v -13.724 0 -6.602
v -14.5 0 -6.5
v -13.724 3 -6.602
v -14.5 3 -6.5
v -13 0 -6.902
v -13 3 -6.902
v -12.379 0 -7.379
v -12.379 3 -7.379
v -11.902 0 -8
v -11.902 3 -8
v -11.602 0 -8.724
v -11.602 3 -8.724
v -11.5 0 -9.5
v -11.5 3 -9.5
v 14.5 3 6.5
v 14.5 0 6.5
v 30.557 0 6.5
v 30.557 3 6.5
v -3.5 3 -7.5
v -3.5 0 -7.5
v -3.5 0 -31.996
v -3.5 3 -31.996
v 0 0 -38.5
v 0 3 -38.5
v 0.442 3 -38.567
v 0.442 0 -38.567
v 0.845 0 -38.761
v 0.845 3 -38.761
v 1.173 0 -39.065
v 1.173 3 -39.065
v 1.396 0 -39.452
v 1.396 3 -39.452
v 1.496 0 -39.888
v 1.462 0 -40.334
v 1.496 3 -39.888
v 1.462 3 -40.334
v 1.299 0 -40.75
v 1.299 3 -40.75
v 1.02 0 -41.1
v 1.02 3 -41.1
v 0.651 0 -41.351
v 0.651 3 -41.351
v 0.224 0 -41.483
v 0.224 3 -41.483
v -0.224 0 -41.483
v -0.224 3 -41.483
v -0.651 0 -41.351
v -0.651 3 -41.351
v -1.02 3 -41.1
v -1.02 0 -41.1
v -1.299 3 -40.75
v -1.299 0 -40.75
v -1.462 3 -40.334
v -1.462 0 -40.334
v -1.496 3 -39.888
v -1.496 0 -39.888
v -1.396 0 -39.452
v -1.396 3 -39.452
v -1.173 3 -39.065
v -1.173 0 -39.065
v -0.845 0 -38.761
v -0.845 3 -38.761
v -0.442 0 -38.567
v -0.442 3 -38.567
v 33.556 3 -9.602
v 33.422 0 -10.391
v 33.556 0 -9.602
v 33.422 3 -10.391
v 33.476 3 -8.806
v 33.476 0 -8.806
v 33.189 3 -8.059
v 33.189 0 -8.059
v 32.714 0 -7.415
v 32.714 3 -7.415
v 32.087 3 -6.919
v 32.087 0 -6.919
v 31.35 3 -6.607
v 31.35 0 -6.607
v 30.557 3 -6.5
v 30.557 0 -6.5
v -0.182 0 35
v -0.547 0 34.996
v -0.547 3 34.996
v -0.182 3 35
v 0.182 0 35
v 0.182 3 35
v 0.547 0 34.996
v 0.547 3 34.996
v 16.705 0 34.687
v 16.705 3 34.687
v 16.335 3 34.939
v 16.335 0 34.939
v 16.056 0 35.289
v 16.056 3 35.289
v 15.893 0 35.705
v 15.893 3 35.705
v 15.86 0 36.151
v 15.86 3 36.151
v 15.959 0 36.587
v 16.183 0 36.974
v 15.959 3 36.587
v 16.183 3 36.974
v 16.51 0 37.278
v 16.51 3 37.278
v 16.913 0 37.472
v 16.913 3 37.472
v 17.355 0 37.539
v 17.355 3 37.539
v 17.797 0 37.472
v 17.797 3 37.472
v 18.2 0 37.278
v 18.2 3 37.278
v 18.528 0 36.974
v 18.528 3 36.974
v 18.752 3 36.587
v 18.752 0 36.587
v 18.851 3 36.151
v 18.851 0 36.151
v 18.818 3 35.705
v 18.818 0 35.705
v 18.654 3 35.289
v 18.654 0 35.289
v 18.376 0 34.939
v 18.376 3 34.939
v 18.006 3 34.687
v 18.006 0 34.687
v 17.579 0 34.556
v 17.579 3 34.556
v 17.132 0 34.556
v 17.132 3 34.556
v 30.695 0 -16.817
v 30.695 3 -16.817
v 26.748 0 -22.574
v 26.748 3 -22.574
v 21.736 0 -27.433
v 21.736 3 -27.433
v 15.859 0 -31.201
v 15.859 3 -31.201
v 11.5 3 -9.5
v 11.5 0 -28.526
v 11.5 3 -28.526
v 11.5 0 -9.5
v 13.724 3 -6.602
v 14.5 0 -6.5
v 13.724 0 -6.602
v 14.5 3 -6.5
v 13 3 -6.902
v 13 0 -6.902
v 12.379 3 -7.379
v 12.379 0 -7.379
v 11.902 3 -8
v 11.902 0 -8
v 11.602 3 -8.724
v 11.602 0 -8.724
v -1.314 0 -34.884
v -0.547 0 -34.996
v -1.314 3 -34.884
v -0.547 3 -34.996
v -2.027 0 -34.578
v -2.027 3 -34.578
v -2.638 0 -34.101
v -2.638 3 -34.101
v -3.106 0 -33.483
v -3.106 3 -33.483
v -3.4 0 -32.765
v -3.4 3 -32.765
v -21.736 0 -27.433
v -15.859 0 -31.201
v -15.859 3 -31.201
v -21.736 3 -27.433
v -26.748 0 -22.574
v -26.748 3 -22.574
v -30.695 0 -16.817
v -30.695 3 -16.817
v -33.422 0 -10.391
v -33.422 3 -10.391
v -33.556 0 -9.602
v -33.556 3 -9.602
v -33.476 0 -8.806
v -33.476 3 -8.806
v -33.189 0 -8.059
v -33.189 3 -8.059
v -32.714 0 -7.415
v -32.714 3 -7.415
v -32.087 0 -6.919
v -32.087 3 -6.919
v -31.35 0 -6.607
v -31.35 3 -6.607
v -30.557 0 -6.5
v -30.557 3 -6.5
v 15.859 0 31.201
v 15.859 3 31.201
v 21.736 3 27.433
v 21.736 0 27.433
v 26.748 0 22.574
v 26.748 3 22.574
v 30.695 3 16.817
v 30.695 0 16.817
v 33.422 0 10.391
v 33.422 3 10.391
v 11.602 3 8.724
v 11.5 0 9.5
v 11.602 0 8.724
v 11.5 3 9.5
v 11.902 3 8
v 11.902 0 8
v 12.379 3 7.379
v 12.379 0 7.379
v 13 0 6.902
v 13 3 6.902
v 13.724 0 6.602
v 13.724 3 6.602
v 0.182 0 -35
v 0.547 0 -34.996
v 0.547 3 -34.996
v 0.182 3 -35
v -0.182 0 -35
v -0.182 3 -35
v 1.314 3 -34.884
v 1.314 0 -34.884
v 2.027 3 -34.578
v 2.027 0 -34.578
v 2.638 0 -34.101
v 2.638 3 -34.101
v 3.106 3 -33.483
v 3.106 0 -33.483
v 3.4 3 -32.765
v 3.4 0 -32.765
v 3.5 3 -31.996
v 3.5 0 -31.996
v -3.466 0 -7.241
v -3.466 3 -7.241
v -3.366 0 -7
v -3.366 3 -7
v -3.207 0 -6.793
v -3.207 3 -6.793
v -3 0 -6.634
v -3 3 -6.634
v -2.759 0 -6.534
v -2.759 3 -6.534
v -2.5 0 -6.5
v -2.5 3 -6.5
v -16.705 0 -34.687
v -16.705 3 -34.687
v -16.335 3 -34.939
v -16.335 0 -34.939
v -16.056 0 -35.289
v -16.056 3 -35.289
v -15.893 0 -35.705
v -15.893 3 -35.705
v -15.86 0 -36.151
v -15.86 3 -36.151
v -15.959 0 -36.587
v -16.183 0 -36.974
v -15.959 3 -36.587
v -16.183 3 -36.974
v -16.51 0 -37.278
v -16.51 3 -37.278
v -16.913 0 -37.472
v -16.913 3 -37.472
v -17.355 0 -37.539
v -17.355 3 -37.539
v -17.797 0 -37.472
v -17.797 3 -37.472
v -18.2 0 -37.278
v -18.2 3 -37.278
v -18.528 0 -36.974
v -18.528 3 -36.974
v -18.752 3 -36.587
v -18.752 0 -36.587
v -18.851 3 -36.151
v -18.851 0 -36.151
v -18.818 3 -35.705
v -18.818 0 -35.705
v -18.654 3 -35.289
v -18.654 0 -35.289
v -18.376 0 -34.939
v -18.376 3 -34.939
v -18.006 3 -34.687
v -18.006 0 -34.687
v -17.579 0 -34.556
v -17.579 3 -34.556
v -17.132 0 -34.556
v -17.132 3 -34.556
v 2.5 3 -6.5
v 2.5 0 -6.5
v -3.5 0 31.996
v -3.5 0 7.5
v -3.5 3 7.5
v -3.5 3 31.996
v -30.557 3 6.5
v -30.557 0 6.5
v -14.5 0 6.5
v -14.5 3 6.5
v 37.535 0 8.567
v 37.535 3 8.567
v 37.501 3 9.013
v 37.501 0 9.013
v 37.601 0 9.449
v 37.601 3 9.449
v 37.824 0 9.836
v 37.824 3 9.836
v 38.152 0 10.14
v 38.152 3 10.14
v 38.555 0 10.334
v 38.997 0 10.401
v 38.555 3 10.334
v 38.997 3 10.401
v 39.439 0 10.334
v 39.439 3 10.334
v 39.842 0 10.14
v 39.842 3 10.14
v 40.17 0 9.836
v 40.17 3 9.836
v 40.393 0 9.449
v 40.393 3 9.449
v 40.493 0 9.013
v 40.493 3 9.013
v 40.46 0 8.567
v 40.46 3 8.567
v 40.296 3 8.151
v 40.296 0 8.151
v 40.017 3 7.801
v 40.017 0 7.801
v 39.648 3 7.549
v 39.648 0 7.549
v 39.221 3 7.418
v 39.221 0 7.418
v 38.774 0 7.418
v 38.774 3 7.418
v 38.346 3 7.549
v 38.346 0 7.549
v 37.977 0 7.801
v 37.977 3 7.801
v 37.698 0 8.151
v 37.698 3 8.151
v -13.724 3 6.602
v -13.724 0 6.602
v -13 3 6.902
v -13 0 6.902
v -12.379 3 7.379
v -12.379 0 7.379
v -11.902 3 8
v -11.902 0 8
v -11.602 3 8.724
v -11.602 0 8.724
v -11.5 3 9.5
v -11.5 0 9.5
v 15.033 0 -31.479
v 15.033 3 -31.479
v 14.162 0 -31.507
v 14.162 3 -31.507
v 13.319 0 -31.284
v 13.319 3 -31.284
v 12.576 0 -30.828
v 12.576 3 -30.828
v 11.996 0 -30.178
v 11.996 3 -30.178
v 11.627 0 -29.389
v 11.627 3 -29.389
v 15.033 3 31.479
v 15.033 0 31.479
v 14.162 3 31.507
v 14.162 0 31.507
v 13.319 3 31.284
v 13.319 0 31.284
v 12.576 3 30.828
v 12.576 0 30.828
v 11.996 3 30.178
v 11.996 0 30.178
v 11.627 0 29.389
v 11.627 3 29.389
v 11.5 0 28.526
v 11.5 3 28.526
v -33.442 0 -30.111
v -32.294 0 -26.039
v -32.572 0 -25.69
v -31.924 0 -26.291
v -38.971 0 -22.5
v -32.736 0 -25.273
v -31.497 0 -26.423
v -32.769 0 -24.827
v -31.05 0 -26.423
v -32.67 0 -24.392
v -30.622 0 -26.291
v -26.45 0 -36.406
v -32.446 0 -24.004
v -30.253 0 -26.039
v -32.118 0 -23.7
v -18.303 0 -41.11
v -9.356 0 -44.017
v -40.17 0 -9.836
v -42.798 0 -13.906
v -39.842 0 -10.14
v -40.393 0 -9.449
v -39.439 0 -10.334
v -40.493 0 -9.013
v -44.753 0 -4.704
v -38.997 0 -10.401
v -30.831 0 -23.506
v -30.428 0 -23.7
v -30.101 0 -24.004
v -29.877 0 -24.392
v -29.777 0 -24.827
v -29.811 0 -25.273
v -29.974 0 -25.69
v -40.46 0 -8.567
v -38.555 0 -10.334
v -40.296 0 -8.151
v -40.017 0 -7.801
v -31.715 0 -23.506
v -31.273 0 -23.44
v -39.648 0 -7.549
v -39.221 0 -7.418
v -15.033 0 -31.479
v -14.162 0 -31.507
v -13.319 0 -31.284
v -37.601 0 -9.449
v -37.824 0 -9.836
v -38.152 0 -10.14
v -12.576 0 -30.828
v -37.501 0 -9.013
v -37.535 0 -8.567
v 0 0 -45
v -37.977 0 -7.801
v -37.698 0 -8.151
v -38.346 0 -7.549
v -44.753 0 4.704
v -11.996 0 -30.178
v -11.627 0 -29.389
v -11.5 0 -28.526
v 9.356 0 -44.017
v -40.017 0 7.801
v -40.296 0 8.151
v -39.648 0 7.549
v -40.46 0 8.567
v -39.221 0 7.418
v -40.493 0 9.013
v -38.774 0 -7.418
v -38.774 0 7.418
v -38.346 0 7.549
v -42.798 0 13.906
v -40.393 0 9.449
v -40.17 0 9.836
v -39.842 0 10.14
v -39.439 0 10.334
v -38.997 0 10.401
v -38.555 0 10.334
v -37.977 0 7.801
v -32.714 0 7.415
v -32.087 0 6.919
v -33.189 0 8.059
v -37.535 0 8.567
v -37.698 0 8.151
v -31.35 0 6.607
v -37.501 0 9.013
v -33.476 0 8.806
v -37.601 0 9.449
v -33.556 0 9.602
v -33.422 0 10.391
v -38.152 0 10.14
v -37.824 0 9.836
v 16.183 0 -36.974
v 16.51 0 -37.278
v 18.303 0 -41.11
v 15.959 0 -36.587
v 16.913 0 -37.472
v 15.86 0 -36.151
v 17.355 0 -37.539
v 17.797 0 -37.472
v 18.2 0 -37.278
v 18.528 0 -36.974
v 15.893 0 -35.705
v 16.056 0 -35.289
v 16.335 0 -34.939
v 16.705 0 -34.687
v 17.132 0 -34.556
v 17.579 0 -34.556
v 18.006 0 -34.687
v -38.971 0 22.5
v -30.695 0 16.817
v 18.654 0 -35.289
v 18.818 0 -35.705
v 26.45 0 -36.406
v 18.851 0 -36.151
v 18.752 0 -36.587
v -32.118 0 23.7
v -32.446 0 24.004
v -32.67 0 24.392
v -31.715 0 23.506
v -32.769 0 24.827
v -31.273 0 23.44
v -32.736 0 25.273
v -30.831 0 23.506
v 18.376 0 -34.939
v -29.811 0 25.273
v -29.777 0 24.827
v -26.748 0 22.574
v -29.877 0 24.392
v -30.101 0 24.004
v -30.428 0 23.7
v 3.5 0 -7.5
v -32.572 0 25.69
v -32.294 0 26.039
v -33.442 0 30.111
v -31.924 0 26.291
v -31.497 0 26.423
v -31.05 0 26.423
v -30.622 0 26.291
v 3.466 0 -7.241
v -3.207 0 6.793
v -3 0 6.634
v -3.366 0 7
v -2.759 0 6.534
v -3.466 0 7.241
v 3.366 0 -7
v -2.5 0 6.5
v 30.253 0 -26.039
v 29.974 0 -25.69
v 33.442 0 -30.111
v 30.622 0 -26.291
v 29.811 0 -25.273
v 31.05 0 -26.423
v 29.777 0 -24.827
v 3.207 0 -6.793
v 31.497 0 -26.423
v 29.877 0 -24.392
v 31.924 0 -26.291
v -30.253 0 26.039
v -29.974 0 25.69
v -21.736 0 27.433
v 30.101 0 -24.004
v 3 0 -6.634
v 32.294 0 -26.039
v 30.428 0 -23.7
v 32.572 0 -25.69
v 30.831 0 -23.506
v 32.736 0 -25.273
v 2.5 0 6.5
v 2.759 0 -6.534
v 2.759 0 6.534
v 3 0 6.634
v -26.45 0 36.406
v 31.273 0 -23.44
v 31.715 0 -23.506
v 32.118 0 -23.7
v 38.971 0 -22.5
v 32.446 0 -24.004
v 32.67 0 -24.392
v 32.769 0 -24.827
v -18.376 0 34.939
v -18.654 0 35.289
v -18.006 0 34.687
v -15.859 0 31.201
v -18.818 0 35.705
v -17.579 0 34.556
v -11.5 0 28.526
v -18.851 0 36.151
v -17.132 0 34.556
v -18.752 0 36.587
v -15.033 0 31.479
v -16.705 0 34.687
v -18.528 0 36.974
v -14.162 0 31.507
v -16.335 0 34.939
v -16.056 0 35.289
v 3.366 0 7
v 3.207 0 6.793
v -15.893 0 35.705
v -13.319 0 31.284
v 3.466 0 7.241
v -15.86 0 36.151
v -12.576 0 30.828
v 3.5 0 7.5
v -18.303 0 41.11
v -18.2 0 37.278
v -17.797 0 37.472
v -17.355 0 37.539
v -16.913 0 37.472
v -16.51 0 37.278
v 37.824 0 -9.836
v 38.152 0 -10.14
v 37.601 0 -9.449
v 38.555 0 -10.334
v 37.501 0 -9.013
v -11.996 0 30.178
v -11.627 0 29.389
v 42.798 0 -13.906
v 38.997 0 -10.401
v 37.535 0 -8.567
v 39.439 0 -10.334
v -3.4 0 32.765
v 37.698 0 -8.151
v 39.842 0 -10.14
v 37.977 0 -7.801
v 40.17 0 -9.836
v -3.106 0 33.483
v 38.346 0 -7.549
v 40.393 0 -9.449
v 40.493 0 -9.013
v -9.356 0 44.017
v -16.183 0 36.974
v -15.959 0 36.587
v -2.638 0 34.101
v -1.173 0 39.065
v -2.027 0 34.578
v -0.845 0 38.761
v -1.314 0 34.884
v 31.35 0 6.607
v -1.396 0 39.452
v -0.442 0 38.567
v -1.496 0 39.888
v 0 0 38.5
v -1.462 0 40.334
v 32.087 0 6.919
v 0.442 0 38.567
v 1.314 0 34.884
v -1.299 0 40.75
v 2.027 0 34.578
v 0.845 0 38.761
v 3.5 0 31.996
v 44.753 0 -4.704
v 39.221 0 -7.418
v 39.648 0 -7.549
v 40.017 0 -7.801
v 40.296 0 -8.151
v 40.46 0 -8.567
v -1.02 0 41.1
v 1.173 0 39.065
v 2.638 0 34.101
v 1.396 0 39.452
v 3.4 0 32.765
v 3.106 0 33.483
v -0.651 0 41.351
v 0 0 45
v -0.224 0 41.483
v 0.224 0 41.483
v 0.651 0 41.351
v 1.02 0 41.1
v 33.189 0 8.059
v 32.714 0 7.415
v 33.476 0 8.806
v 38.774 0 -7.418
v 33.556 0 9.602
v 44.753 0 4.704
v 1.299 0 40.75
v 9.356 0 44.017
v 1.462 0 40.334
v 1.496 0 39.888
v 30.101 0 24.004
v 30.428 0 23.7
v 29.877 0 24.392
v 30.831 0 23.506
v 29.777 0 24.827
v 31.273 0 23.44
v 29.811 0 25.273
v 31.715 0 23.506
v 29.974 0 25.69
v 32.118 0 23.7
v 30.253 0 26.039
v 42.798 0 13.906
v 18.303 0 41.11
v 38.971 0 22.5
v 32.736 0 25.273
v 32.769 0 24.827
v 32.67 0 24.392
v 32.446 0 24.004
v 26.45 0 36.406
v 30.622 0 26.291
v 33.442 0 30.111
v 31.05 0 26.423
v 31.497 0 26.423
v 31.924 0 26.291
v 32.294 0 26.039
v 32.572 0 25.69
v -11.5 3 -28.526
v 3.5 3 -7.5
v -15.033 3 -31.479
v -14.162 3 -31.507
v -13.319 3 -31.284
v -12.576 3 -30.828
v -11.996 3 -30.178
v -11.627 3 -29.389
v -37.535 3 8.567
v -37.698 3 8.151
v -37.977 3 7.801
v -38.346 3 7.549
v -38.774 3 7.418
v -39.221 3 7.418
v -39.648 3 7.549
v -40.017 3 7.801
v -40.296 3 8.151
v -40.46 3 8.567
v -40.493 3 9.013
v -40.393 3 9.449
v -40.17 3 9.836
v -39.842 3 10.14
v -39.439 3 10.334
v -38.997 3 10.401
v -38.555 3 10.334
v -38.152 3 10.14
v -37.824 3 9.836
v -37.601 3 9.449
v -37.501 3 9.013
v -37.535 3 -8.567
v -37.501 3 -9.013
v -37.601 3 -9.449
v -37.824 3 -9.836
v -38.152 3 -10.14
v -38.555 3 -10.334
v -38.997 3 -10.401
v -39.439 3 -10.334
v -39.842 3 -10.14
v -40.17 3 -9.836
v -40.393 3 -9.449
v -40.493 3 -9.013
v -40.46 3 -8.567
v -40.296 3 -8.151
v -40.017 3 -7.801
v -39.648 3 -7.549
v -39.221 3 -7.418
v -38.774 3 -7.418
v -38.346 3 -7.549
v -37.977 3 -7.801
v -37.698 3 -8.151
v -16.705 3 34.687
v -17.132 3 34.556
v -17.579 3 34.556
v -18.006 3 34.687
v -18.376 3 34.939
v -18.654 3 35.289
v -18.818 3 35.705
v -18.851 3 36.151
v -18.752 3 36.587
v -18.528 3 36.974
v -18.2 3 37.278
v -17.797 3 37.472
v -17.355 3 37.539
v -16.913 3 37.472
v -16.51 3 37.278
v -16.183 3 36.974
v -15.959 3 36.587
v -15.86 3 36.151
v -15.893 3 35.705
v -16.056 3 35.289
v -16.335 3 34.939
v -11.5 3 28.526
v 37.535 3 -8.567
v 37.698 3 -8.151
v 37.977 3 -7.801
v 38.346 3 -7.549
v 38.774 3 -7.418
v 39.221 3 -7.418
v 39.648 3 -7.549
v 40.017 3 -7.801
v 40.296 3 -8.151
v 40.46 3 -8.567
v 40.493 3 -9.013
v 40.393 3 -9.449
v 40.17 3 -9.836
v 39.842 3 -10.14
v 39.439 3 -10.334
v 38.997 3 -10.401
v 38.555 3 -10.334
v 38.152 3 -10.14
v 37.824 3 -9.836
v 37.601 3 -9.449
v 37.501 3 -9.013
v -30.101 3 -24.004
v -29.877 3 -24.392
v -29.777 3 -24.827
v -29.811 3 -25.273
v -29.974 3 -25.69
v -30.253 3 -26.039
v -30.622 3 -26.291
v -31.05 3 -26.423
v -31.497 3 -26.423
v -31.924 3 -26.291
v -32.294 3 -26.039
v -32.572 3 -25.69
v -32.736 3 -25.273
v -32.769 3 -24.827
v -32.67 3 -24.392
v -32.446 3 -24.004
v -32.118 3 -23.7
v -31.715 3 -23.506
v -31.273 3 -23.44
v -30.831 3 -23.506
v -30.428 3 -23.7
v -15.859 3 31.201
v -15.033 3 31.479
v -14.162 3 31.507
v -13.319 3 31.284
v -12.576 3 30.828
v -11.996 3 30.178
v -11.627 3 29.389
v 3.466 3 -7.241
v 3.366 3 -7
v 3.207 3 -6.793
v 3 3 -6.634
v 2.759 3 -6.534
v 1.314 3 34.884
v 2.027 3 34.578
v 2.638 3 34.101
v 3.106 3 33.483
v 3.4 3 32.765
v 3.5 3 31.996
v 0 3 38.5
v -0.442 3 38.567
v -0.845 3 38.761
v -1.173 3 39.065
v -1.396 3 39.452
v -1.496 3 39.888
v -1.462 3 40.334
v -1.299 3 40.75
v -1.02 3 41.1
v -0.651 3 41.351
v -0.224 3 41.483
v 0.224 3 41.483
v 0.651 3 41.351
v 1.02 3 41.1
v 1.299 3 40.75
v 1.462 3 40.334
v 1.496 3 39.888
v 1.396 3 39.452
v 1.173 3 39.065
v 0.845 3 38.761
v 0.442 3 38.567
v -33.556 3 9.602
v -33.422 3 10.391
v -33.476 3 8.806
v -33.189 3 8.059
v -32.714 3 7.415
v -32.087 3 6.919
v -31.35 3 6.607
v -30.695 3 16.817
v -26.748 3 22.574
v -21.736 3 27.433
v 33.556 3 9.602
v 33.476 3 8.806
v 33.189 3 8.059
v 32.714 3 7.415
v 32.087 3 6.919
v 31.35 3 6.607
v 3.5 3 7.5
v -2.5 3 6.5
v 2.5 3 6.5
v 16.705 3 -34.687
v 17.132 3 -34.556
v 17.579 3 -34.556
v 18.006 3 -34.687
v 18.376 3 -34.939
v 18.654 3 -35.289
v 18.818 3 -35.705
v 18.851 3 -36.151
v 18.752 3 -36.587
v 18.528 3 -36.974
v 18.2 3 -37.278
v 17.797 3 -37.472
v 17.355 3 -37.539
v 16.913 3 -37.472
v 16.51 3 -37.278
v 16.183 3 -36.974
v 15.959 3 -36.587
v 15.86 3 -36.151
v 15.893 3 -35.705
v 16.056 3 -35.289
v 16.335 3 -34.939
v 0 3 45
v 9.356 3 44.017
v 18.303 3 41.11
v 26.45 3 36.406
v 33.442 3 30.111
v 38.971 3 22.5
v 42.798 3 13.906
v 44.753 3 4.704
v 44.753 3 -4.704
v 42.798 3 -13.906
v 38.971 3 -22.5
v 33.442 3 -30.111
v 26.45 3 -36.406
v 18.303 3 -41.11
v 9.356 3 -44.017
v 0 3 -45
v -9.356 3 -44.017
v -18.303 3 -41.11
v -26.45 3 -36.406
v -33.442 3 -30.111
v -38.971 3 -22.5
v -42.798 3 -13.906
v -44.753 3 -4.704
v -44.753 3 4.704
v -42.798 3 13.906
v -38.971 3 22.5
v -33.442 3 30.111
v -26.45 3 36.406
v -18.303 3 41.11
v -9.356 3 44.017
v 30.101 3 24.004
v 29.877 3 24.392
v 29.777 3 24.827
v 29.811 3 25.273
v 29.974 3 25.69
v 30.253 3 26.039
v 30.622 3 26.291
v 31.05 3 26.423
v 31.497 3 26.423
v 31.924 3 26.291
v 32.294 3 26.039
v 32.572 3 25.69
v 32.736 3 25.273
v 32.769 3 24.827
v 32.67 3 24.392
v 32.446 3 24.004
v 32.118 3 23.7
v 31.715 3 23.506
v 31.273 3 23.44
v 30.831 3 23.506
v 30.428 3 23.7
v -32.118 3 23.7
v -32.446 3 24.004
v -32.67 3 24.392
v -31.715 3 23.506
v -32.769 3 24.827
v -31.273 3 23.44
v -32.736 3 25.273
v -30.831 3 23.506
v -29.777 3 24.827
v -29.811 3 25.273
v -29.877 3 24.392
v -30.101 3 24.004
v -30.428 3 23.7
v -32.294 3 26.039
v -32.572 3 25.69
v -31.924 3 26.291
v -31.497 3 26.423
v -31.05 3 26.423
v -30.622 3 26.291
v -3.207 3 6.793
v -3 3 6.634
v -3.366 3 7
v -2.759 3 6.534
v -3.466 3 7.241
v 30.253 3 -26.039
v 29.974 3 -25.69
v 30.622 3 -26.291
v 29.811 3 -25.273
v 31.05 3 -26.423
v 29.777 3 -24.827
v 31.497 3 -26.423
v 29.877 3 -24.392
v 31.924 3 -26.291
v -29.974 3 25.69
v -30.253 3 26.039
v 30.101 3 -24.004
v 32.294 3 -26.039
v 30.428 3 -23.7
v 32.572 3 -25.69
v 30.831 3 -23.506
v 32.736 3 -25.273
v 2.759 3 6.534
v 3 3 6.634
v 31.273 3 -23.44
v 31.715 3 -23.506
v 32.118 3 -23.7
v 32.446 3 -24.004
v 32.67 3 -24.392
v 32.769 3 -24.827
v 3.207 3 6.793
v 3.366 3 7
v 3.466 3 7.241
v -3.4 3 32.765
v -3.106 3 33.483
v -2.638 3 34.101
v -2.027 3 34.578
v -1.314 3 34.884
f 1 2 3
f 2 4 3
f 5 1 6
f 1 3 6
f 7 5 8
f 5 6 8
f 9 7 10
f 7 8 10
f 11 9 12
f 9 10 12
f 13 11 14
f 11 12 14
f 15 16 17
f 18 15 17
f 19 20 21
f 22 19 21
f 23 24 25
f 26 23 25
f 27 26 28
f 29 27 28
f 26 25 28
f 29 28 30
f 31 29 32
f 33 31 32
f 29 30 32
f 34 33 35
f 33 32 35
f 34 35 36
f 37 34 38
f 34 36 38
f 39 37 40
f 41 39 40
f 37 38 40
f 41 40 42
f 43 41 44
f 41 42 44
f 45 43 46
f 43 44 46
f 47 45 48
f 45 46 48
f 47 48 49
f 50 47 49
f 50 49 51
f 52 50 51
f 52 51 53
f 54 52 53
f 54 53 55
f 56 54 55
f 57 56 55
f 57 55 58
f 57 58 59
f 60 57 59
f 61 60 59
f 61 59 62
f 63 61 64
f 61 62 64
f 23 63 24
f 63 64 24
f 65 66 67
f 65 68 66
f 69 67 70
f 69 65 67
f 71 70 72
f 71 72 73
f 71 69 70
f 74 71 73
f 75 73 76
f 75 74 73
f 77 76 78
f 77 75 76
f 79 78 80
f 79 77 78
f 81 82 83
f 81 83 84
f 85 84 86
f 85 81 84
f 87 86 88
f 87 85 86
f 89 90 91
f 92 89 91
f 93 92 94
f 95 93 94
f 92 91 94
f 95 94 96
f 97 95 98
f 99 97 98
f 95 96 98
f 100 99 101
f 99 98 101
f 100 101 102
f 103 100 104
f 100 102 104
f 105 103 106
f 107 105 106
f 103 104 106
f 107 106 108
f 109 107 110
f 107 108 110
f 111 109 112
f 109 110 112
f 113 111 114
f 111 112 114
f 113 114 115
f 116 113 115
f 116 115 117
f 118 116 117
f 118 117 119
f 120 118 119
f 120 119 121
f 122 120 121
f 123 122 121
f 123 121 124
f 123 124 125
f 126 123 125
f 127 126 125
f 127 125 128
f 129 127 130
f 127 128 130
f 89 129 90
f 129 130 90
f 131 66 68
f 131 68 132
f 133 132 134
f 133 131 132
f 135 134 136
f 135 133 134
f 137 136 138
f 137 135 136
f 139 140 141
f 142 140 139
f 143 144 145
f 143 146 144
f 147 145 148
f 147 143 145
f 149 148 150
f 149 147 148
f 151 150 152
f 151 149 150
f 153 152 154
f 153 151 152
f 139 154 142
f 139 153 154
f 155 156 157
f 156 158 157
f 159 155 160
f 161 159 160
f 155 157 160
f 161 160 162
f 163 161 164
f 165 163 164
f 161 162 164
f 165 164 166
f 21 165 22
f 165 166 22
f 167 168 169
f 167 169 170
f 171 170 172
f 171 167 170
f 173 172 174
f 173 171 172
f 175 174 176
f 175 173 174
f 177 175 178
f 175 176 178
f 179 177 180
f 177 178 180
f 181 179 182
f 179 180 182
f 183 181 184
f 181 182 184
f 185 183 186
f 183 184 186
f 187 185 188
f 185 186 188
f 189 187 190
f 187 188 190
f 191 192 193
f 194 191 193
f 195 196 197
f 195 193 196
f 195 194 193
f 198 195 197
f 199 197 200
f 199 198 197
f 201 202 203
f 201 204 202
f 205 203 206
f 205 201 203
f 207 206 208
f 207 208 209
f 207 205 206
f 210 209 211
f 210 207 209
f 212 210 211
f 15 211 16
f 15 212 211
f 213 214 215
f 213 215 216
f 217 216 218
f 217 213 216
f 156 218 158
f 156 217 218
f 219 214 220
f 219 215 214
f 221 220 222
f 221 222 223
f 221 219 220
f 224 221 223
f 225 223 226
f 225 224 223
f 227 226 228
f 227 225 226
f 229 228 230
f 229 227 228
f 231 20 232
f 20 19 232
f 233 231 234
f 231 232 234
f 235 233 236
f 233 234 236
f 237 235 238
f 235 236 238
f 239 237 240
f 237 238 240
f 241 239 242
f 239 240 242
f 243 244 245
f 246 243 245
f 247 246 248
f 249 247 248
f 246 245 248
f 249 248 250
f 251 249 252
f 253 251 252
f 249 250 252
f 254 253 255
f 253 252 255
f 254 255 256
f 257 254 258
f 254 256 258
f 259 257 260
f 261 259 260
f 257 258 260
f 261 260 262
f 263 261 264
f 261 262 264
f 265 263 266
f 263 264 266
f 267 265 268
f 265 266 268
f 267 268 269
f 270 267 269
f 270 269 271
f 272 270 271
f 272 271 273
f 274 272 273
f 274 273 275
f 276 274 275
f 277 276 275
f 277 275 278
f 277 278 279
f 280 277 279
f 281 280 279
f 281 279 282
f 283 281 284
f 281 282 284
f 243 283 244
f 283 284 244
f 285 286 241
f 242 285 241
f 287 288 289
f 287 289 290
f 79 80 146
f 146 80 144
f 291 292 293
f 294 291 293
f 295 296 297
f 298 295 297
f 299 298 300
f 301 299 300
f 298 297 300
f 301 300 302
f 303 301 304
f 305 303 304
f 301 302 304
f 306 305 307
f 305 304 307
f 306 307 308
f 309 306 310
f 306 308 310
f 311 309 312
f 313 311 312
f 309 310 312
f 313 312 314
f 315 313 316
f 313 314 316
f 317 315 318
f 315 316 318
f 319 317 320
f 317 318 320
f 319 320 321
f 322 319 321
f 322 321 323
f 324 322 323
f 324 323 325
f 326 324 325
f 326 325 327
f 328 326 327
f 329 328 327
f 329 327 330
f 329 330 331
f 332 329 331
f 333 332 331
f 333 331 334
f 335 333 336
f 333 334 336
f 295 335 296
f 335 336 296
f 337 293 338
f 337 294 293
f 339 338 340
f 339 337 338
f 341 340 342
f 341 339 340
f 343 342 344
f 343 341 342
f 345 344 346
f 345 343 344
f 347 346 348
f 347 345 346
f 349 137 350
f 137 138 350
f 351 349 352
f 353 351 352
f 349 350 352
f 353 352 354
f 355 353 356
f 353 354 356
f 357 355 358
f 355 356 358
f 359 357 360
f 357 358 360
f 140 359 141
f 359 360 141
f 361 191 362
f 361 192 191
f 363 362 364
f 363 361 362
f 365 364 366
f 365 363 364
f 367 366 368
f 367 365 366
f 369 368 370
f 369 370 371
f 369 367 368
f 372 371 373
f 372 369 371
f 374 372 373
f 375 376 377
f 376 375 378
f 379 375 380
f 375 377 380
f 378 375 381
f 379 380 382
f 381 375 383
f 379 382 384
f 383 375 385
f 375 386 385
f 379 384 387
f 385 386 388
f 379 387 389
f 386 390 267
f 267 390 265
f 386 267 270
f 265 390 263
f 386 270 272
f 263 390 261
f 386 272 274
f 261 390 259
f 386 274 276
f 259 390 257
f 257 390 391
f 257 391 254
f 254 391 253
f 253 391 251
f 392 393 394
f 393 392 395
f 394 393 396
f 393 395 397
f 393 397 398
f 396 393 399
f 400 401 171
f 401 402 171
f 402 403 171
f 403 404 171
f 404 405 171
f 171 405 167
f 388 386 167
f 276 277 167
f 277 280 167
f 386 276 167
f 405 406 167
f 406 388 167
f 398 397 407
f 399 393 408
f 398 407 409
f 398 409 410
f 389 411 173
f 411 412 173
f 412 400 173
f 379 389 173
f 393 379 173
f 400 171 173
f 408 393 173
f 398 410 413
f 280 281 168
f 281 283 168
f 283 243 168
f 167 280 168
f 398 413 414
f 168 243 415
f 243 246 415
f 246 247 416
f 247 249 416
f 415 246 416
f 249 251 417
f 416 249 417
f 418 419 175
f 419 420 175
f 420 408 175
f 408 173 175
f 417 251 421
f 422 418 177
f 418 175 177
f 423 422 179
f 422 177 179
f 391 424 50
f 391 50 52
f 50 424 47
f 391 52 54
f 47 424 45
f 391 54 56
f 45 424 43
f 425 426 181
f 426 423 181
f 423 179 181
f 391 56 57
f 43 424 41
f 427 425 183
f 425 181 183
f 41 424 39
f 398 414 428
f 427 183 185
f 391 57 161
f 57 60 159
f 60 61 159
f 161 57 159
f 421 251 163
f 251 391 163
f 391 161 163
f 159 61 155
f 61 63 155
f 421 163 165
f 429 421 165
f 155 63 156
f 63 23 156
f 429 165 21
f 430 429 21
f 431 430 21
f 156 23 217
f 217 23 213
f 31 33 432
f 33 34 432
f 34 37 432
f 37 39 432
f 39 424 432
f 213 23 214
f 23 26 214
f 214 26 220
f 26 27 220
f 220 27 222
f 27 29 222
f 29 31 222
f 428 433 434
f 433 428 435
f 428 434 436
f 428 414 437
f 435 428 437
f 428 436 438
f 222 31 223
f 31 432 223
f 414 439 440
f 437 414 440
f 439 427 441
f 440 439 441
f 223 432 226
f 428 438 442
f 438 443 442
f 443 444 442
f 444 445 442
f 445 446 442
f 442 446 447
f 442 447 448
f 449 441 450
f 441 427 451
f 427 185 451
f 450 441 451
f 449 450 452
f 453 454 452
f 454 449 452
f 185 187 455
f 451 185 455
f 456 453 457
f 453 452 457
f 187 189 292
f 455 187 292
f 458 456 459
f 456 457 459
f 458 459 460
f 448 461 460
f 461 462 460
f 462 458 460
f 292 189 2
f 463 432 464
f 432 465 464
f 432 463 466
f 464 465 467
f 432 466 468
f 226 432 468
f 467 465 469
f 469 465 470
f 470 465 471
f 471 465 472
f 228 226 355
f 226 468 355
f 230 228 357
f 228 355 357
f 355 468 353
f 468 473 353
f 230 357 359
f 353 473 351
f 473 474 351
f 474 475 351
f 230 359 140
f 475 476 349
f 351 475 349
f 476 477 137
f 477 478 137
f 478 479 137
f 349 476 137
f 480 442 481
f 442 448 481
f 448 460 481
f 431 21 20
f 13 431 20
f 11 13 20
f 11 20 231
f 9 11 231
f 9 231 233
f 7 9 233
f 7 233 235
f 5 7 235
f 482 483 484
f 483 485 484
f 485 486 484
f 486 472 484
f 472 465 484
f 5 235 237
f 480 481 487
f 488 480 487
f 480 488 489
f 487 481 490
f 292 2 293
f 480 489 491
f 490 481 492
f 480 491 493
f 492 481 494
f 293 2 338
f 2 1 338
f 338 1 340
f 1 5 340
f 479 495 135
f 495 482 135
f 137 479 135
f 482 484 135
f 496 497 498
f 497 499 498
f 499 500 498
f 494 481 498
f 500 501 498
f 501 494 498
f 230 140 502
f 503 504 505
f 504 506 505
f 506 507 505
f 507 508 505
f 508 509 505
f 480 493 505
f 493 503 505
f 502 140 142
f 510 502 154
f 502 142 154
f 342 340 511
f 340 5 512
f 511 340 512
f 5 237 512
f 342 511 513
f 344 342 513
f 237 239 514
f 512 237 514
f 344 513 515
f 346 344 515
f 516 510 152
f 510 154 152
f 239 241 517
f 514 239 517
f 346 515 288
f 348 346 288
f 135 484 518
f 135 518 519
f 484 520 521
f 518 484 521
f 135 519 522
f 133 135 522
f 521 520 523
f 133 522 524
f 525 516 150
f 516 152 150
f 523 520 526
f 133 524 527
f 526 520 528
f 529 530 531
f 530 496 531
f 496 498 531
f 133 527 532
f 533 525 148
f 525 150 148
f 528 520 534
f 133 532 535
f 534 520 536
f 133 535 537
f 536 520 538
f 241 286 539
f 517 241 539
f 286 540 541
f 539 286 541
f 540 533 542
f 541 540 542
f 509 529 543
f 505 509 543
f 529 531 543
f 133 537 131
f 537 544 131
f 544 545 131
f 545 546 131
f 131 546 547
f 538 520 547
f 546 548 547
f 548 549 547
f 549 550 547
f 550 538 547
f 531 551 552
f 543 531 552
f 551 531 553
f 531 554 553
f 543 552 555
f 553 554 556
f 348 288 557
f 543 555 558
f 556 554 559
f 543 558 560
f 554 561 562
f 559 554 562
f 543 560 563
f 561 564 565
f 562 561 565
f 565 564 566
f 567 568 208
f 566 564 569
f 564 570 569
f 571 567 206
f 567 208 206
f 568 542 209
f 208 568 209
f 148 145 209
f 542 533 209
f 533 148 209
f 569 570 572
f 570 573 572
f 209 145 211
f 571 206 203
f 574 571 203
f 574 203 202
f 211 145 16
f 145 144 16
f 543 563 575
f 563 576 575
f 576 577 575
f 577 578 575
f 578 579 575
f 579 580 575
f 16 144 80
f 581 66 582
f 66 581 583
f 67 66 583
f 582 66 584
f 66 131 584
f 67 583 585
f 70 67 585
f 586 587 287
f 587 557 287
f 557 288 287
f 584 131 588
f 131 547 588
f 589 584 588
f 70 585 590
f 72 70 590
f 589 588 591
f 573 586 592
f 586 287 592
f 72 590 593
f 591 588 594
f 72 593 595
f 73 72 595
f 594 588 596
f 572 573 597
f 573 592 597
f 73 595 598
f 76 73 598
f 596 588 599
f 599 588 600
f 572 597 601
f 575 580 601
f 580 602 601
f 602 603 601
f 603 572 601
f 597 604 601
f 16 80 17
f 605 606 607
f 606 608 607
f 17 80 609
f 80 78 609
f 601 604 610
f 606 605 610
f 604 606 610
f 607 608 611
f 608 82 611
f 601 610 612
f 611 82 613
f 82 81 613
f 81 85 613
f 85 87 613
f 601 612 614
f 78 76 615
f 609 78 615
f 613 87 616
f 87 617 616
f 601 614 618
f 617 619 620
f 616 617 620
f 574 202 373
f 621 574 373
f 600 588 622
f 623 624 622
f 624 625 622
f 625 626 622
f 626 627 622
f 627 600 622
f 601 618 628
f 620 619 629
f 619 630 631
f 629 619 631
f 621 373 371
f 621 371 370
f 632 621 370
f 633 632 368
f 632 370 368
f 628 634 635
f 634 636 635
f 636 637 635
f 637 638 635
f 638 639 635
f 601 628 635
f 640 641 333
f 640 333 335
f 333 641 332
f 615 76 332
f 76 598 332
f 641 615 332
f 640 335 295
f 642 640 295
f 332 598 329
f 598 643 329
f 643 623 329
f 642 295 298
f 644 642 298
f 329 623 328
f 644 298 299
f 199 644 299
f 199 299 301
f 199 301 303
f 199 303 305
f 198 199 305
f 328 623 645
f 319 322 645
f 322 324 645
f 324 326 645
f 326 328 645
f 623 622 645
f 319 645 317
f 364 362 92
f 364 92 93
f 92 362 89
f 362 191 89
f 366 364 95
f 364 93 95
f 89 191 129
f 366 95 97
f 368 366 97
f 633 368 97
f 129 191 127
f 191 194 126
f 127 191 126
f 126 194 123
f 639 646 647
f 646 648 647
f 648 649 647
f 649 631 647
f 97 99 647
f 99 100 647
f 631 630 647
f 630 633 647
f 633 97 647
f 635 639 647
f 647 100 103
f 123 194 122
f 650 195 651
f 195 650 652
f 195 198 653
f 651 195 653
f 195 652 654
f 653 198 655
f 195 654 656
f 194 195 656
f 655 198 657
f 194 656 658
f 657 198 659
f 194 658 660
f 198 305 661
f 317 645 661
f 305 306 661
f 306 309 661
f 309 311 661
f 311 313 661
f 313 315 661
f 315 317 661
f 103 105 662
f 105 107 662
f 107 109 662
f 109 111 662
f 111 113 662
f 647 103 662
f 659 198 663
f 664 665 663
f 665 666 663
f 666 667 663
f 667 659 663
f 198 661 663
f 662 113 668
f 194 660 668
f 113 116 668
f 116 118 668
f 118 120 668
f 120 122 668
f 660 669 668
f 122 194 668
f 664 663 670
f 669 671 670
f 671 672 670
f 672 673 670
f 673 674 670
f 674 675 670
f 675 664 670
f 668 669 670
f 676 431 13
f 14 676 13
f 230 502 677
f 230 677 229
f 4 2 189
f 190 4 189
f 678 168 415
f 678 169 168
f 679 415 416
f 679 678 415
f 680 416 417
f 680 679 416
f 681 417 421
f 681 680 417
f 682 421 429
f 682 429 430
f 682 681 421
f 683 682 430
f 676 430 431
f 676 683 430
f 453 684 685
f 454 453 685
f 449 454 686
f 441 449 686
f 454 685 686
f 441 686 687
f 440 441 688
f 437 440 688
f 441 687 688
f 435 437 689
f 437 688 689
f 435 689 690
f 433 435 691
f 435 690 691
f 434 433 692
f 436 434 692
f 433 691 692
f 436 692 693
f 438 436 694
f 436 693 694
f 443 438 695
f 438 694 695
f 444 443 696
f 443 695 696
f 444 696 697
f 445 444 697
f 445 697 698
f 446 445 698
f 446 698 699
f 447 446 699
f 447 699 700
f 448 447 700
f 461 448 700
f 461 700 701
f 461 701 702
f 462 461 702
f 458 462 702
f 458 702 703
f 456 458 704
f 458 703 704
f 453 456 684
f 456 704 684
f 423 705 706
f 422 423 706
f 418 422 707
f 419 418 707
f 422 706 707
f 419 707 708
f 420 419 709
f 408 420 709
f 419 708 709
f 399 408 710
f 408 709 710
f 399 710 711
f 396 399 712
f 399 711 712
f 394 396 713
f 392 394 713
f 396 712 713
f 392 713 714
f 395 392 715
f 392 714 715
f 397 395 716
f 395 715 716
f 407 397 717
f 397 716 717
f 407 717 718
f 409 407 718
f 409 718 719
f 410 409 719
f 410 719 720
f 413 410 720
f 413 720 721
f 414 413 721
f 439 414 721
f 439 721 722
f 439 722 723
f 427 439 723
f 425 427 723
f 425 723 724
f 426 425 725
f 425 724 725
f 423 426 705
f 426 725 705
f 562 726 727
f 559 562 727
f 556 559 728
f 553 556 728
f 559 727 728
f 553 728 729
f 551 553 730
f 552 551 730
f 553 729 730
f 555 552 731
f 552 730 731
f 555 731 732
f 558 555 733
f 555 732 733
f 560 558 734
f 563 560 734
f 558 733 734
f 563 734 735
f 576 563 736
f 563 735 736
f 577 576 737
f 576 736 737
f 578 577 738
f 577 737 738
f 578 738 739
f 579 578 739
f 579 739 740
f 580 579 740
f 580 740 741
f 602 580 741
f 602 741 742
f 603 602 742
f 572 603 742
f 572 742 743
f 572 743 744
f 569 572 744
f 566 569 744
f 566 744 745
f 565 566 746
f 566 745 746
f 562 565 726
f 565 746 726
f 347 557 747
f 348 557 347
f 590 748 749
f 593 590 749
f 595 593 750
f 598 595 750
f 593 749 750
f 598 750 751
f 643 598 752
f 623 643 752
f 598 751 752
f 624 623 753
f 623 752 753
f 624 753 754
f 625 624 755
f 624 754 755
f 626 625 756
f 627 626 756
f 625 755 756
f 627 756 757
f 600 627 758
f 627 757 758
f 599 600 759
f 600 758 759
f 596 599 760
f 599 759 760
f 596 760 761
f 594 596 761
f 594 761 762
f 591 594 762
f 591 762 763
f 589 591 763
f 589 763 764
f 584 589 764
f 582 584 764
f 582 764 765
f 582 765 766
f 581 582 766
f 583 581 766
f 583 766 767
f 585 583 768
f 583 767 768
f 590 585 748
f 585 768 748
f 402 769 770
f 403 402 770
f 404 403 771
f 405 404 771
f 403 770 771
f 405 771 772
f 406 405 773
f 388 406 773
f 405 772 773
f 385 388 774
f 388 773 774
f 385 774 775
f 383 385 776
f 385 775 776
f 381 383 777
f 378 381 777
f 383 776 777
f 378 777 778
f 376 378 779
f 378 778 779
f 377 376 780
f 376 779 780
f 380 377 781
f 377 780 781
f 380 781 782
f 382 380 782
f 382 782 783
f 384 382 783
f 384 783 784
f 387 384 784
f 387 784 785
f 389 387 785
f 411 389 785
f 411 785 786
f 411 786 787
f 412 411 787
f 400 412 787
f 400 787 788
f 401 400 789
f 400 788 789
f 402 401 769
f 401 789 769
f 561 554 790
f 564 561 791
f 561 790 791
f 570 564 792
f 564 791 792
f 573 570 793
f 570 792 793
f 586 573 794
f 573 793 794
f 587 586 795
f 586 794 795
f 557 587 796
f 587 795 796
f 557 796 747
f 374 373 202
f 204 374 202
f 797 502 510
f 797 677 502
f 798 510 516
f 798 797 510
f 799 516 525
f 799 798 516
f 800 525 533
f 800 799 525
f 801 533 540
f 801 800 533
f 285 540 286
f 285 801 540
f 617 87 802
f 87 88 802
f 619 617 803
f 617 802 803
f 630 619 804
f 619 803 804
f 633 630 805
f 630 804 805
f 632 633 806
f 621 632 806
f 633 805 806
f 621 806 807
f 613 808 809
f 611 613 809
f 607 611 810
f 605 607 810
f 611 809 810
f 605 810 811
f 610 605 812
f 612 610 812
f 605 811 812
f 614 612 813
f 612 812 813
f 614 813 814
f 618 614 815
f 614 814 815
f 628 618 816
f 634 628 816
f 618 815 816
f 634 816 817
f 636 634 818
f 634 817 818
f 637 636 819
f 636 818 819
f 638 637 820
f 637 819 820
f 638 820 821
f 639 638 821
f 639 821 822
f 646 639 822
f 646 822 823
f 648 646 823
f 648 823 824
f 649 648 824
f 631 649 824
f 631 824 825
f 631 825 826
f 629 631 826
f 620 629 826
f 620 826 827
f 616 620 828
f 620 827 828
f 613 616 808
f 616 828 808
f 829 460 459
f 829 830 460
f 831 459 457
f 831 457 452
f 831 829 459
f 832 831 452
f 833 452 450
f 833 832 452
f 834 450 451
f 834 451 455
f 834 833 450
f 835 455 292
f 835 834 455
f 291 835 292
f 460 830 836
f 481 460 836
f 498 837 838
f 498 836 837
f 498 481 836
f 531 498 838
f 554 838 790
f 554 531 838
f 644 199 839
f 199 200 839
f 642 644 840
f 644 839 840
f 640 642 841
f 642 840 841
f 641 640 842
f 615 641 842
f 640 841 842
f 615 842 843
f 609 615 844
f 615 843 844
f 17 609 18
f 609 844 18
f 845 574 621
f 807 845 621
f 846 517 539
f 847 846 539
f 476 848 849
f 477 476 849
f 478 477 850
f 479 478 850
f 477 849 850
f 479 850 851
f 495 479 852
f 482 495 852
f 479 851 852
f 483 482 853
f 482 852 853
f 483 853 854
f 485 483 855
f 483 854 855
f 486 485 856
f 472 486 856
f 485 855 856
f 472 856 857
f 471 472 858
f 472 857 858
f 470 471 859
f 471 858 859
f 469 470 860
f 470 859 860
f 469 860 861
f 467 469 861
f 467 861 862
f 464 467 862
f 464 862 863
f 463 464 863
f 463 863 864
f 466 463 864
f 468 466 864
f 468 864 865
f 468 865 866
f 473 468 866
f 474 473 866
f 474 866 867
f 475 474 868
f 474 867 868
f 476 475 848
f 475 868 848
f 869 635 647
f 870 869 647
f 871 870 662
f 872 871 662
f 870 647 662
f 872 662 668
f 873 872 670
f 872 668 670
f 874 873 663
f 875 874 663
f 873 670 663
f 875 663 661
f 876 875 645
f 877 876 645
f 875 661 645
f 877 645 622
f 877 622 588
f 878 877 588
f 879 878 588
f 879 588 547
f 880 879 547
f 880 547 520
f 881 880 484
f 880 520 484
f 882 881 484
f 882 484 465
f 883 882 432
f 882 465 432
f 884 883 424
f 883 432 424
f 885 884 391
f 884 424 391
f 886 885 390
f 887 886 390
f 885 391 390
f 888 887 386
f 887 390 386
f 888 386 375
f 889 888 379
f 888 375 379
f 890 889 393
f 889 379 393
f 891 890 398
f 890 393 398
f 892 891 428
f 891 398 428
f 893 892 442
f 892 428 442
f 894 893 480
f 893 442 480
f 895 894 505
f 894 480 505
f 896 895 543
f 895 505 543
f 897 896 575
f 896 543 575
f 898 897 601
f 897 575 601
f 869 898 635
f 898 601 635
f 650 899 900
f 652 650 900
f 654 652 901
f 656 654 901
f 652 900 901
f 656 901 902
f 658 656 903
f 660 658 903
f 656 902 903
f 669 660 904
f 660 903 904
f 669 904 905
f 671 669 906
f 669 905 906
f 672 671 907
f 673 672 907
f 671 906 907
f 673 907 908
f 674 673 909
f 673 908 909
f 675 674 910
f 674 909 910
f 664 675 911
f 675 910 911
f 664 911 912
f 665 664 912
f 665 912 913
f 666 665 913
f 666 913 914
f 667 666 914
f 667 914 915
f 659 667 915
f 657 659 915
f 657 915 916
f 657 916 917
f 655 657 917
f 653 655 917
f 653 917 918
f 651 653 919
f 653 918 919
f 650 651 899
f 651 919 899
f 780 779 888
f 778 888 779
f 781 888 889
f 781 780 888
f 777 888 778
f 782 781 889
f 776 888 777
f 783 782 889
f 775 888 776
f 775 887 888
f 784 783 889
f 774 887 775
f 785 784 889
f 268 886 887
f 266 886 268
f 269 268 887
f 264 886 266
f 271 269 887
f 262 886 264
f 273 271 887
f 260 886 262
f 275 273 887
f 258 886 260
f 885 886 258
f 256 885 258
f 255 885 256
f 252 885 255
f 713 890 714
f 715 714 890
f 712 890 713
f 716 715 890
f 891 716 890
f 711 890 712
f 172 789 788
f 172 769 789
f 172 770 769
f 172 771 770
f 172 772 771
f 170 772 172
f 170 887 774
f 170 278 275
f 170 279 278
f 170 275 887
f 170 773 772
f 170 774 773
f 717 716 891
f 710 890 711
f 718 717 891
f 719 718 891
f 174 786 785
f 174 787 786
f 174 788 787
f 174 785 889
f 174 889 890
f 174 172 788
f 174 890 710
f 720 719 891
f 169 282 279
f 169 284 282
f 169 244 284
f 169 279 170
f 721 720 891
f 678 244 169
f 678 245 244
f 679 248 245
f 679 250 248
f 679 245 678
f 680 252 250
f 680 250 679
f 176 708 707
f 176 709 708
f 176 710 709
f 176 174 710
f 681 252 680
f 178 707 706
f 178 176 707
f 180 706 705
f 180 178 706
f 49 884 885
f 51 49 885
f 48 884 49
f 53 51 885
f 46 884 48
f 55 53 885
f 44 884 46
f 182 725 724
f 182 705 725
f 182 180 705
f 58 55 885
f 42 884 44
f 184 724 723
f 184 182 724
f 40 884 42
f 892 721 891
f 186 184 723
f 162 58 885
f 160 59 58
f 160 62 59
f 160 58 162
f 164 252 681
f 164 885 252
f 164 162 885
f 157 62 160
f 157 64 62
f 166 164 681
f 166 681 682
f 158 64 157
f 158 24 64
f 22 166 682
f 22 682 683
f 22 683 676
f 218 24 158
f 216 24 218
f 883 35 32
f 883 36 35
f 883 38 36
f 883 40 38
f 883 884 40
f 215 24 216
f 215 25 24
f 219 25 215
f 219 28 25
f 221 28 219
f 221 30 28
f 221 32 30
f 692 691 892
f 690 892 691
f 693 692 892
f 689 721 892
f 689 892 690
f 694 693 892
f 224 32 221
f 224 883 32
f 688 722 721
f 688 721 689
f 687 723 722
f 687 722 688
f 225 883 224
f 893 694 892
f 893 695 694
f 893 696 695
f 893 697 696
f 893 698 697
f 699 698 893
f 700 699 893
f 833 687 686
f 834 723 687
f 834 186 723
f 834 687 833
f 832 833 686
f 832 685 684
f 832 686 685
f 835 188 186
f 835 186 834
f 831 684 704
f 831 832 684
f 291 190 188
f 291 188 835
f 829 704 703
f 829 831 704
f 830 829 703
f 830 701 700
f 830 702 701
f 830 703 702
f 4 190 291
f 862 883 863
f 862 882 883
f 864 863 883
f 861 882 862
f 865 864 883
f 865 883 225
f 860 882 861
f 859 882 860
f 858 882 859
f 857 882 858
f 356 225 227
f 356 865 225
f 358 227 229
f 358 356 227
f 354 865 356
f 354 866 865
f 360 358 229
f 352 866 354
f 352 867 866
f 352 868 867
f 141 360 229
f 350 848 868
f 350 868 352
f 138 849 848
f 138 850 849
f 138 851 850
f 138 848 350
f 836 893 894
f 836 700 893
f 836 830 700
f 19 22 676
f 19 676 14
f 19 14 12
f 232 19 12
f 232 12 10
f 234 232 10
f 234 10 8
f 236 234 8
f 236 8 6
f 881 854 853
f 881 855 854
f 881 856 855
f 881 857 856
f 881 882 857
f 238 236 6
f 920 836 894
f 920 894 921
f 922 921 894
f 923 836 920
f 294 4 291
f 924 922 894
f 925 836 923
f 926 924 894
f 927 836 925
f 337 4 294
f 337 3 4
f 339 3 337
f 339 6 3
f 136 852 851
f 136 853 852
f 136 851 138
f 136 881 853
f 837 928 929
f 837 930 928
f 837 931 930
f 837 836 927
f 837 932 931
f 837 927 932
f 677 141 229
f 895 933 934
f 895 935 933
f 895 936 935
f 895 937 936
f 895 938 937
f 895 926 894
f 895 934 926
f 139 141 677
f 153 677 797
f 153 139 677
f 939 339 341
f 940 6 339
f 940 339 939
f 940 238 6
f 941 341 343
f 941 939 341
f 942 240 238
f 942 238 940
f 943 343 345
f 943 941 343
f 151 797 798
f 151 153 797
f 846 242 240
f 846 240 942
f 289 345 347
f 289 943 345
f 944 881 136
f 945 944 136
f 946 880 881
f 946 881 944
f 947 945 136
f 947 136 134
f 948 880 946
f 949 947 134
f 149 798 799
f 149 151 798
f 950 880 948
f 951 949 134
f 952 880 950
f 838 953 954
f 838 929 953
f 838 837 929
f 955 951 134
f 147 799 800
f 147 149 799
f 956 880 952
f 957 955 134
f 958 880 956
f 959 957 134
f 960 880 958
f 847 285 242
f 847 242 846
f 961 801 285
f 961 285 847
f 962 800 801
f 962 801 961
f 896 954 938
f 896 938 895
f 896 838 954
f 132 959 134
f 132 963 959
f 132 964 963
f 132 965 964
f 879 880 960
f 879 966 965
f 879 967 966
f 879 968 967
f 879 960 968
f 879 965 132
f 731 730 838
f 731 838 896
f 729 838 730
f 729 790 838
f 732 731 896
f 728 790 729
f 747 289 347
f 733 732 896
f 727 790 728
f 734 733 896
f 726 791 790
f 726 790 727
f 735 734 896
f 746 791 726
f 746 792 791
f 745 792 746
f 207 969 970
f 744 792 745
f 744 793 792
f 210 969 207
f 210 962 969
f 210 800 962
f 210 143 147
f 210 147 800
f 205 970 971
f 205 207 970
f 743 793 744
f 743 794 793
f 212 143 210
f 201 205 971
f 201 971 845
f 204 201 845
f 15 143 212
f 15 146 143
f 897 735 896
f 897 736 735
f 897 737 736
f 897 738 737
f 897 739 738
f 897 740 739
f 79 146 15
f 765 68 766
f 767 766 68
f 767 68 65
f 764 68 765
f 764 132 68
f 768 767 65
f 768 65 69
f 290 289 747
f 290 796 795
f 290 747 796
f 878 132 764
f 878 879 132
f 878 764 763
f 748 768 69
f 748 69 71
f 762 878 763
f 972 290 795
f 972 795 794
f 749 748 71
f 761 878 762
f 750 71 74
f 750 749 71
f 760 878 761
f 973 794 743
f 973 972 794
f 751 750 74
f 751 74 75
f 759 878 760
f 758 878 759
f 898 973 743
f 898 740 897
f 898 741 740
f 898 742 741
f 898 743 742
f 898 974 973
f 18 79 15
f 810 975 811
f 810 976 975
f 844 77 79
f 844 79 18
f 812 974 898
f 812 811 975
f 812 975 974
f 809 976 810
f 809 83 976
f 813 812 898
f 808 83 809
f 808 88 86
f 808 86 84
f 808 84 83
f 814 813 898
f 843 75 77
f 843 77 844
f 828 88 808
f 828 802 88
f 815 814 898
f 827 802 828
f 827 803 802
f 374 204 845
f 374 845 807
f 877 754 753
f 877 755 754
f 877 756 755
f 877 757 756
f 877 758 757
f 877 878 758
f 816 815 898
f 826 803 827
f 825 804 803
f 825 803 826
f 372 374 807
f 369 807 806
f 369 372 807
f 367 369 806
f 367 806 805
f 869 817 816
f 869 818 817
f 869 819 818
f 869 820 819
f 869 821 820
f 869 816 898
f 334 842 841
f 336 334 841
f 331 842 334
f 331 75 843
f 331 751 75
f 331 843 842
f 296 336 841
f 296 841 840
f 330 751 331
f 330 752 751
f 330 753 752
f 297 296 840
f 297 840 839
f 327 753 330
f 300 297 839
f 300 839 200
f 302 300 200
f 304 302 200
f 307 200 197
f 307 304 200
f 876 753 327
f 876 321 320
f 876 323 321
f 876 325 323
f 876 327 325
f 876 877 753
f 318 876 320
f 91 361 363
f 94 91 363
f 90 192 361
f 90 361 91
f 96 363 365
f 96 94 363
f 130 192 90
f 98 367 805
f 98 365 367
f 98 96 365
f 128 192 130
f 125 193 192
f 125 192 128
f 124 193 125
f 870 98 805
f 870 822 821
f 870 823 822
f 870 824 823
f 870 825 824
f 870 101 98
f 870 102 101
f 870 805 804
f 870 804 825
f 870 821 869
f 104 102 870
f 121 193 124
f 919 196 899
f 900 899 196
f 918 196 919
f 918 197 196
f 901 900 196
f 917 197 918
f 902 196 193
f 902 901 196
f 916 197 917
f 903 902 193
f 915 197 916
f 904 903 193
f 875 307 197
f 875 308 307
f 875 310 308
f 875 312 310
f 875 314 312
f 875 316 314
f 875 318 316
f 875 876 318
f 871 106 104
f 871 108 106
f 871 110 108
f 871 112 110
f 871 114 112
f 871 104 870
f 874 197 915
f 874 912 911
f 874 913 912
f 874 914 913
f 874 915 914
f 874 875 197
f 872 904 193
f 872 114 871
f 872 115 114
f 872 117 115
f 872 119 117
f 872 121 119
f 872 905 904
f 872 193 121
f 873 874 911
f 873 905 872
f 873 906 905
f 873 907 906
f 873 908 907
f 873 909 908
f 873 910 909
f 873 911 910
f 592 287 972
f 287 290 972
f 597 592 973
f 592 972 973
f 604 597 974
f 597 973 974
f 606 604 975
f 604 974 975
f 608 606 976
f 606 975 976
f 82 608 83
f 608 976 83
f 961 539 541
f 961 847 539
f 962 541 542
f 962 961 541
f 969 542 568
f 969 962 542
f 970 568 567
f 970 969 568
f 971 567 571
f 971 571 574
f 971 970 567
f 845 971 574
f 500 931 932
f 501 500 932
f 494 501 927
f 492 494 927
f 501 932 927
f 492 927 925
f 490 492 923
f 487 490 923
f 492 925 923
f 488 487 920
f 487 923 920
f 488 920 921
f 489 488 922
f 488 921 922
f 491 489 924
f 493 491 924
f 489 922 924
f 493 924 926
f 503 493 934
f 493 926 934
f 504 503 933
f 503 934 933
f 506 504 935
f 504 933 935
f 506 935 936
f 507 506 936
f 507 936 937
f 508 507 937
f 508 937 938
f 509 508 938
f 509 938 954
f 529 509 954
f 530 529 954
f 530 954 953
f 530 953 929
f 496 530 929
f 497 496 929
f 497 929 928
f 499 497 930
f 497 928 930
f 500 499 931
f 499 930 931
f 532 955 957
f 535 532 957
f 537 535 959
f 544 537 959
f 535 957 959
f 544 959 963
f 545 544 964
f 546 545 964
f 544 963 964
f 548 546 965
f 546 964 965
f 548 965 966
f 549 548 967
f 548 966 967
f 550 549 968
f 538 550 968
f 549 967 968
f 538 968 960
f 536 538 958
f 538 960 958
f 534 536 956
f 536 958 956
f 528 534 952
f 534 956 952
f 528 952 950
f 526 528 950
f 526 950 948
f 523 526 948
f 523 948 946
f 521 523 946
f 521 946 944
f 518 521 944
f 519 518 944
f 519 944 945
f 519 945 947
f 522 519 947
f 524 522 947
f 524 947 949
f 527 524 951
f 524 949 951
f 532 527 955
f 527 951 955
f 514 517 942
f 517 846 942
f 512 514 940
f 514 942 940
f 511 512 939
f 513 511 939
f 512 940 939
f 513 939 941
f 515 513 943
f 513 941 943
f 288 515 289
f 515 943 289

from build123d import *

# Parameters (mm, degrees)
SKETCH_1_R               = 45
SKETCH_1_R_2             = 35
EXTRUDE_1_DEPTH          = 3
EXTRUDE_2_DEPTH          = 3
SKETCH_3_R               = 1.5
CUT_EXTRUDE_1_DEPTH      = 3
PATTERN_CIRCULAR_1_COUNT = 14
FILLET_1_R               = 3
EXTRUDE_3_DEPTH          = 3
FILLET_2_R               = 3
FILLET_3_R               = 1
FILLET_4_R               = 3


with BuildPart() as part:
    # Эскиз1 → Бобышка-Вытянуть1 (new body)
    with BuildSketch(Plane(origin=(0, 0, 0), x_dir=(1, 0, 0), z_dir=(0, 1, 0))):
        with Locations(Location((0, 0, 0), (0, 0, 270))):
            Circle(SKETCH_1_R)
        with Locations(Location((0, 0, 0), (0, 0, 270))):
            Circle(SKETCH_1_R_2, mode=Mode.SUBTRACT)
    extrude(amount=EXTRUDE_1_DEPTH)

    # Эскиз2 → Бобышка-Вытянуть2 (add)
    with BuildSketch(Plane(origin=(0, 0, 0), x_dir=(1, 0, 0), z_dir=(0, 1, 0))):
        with BuildLine():
            ThreePointArc((-34.391132578, 6.5), (-34.847450698, 3.264227303), (-35, 0))
            Line((-35, 0), (35, 0))
            ThreePointArc((35, 0), (34.847450698, 3.264227303), (34.391132578, 6.5))
            Line((34.391132578, 6.5), (-34.391132578, 6.5))
        make_face()
        with BuildLine():
            Line((35, 0), (-35, 0))
            ThreePointArc((-35, 0), (-34.847450698, -3.264227303), (-34.391132578, -6.5))
            Line((-34.391132578, -6.5), (34.391132578, -6.5))
            ThreePointArc((34.391132578, -6.5), (34.847450698, -3.264227303), (35, 0))
        make_face()
    extrude(amount=EXTRUDE_2_DEPTH)

    # Эскиз3 → Вырез-Вытянуть1 (cut)
    with BuildSketch(Plane(origin=(0, 3, 0), x_dir=(1, 0, 0), z_dir=(0, 1, 0))):
        with Locations(Location((0, 40, 0), (0, 0, 270))):
            Circle(SKETCH_3_R)
    cut_extrude_1 = extrude(amount=-CUT_EXTRUDE_1_DEPTH, mode=Mode.SUBTRACT)

    # Круговой массив1: Вырез-Вытянуть1 ×14 about axis
    pattern_circular_1_axis = Axis((0, 0, 0), (0, 1, 0))
    for i in range(1, PATTERN_CIRCULAR_1_COUNT):
        add(cut_extrude_1.rotate(pattern_circular_1_axis, i * 360 / PATTERN_CIRCULAR_1_COUNT), mode=Mode.SUBTRACT)

    # Скругление1
    fillet_1_edges = [part.edges().sort_by_distance(p)[0] for p in [
        (-34.391132578, 1.5, -6.5),
        (-34.391132578, 1.5, 6.5),
        (34.391132578, 1.5, 6.5),
        (34.391132578, 1.5, -6.5),
    ]]
    fillet(fillet_1_edges, radius=FILLET_1_R)

    # Эскиз4 → Бобышка-Вытянуть3 (add)
    with BuildSketch(Plane(origin=(0, 0, 0), x_dir=(1, 0, 0), z_dir=(0, 1, 0))):
        with BuildLine():
            Line((-3.5, 6.5), (-3.5, 34.824560299))
            ThreePointArc((-3.5, 34.824560299), (-7.551905138, 34.175557476), (-11.5, 33.056769352))
            Line((-11.5, 33.056769352), (-11.5, 6.5))
            Line((-11.5, 6.5), (-3.5, 6.5))
        make_face()
        with BuildLine():
            Line((3.5, 6.5), (3.5, 34.824560299))
            ThreePointArc((3.5, 34.824560299), (7.551905138, 34.175557476), (11.5, 33.056769352))
            Line((11.5, 33.056769352), (11.5, 6.5))
            Line((11.5, 6.5), (3.5, 6.5))
        make_face()
    extrude_3 = extrude(amount=EXTRUDE_3_DEPTH)

    # Скругление2
    fillet_2_edges = [part.edges().sort_by_distance(p)[0] for p in [
        (-11.5, 1.5, -6.5),
        (-3.5, 1.5, -34.824560299),
        (-11.5, 1.5, -33.056769352),
        (11.5, 1.5, -6.5),
        (11.5, 1.5, -33.056769352),
        (3.5, 1.5, -34.824560299),
    ]]
    fillet(fillet_2_edges, radius=FILLET_2_R)

    # Зеркальное отражение1: Бобышка-Вытянуть3 across plane
    add(extrude_3.mirror(Plane.XY))

    # Скругление3
    fillet_3_edges = [part.edges().sort_by_distance(p)[0] for p in [
        (-3.5, 1.5, -6.5),
        (3.5, 1.5, -6.5),
        (-3.5, 1.5, 6.5),
        (3.5, 1.5, 6.5),
    ]]
    fillet(fillet_3_edges, radius=FILLET_3_R)

    # Скругление4
    fillet_4_edges = [part.edges().sort_by_distance(p)[0] for p in [
        (-11.5, 1.5, 6.5),
        (-11.5, 1.5, 33.056769352),
        (-3.5, 1.5, 34.824560299),
        (11.5, 1.5, 6.5),
        (3.5, 1.5, 34.824560299),
        (11.5, 1.5, 33.056769352),
    ]]
    fillet(fillet_4_edges, radius=FILLET_4_R)


solid = part.part
